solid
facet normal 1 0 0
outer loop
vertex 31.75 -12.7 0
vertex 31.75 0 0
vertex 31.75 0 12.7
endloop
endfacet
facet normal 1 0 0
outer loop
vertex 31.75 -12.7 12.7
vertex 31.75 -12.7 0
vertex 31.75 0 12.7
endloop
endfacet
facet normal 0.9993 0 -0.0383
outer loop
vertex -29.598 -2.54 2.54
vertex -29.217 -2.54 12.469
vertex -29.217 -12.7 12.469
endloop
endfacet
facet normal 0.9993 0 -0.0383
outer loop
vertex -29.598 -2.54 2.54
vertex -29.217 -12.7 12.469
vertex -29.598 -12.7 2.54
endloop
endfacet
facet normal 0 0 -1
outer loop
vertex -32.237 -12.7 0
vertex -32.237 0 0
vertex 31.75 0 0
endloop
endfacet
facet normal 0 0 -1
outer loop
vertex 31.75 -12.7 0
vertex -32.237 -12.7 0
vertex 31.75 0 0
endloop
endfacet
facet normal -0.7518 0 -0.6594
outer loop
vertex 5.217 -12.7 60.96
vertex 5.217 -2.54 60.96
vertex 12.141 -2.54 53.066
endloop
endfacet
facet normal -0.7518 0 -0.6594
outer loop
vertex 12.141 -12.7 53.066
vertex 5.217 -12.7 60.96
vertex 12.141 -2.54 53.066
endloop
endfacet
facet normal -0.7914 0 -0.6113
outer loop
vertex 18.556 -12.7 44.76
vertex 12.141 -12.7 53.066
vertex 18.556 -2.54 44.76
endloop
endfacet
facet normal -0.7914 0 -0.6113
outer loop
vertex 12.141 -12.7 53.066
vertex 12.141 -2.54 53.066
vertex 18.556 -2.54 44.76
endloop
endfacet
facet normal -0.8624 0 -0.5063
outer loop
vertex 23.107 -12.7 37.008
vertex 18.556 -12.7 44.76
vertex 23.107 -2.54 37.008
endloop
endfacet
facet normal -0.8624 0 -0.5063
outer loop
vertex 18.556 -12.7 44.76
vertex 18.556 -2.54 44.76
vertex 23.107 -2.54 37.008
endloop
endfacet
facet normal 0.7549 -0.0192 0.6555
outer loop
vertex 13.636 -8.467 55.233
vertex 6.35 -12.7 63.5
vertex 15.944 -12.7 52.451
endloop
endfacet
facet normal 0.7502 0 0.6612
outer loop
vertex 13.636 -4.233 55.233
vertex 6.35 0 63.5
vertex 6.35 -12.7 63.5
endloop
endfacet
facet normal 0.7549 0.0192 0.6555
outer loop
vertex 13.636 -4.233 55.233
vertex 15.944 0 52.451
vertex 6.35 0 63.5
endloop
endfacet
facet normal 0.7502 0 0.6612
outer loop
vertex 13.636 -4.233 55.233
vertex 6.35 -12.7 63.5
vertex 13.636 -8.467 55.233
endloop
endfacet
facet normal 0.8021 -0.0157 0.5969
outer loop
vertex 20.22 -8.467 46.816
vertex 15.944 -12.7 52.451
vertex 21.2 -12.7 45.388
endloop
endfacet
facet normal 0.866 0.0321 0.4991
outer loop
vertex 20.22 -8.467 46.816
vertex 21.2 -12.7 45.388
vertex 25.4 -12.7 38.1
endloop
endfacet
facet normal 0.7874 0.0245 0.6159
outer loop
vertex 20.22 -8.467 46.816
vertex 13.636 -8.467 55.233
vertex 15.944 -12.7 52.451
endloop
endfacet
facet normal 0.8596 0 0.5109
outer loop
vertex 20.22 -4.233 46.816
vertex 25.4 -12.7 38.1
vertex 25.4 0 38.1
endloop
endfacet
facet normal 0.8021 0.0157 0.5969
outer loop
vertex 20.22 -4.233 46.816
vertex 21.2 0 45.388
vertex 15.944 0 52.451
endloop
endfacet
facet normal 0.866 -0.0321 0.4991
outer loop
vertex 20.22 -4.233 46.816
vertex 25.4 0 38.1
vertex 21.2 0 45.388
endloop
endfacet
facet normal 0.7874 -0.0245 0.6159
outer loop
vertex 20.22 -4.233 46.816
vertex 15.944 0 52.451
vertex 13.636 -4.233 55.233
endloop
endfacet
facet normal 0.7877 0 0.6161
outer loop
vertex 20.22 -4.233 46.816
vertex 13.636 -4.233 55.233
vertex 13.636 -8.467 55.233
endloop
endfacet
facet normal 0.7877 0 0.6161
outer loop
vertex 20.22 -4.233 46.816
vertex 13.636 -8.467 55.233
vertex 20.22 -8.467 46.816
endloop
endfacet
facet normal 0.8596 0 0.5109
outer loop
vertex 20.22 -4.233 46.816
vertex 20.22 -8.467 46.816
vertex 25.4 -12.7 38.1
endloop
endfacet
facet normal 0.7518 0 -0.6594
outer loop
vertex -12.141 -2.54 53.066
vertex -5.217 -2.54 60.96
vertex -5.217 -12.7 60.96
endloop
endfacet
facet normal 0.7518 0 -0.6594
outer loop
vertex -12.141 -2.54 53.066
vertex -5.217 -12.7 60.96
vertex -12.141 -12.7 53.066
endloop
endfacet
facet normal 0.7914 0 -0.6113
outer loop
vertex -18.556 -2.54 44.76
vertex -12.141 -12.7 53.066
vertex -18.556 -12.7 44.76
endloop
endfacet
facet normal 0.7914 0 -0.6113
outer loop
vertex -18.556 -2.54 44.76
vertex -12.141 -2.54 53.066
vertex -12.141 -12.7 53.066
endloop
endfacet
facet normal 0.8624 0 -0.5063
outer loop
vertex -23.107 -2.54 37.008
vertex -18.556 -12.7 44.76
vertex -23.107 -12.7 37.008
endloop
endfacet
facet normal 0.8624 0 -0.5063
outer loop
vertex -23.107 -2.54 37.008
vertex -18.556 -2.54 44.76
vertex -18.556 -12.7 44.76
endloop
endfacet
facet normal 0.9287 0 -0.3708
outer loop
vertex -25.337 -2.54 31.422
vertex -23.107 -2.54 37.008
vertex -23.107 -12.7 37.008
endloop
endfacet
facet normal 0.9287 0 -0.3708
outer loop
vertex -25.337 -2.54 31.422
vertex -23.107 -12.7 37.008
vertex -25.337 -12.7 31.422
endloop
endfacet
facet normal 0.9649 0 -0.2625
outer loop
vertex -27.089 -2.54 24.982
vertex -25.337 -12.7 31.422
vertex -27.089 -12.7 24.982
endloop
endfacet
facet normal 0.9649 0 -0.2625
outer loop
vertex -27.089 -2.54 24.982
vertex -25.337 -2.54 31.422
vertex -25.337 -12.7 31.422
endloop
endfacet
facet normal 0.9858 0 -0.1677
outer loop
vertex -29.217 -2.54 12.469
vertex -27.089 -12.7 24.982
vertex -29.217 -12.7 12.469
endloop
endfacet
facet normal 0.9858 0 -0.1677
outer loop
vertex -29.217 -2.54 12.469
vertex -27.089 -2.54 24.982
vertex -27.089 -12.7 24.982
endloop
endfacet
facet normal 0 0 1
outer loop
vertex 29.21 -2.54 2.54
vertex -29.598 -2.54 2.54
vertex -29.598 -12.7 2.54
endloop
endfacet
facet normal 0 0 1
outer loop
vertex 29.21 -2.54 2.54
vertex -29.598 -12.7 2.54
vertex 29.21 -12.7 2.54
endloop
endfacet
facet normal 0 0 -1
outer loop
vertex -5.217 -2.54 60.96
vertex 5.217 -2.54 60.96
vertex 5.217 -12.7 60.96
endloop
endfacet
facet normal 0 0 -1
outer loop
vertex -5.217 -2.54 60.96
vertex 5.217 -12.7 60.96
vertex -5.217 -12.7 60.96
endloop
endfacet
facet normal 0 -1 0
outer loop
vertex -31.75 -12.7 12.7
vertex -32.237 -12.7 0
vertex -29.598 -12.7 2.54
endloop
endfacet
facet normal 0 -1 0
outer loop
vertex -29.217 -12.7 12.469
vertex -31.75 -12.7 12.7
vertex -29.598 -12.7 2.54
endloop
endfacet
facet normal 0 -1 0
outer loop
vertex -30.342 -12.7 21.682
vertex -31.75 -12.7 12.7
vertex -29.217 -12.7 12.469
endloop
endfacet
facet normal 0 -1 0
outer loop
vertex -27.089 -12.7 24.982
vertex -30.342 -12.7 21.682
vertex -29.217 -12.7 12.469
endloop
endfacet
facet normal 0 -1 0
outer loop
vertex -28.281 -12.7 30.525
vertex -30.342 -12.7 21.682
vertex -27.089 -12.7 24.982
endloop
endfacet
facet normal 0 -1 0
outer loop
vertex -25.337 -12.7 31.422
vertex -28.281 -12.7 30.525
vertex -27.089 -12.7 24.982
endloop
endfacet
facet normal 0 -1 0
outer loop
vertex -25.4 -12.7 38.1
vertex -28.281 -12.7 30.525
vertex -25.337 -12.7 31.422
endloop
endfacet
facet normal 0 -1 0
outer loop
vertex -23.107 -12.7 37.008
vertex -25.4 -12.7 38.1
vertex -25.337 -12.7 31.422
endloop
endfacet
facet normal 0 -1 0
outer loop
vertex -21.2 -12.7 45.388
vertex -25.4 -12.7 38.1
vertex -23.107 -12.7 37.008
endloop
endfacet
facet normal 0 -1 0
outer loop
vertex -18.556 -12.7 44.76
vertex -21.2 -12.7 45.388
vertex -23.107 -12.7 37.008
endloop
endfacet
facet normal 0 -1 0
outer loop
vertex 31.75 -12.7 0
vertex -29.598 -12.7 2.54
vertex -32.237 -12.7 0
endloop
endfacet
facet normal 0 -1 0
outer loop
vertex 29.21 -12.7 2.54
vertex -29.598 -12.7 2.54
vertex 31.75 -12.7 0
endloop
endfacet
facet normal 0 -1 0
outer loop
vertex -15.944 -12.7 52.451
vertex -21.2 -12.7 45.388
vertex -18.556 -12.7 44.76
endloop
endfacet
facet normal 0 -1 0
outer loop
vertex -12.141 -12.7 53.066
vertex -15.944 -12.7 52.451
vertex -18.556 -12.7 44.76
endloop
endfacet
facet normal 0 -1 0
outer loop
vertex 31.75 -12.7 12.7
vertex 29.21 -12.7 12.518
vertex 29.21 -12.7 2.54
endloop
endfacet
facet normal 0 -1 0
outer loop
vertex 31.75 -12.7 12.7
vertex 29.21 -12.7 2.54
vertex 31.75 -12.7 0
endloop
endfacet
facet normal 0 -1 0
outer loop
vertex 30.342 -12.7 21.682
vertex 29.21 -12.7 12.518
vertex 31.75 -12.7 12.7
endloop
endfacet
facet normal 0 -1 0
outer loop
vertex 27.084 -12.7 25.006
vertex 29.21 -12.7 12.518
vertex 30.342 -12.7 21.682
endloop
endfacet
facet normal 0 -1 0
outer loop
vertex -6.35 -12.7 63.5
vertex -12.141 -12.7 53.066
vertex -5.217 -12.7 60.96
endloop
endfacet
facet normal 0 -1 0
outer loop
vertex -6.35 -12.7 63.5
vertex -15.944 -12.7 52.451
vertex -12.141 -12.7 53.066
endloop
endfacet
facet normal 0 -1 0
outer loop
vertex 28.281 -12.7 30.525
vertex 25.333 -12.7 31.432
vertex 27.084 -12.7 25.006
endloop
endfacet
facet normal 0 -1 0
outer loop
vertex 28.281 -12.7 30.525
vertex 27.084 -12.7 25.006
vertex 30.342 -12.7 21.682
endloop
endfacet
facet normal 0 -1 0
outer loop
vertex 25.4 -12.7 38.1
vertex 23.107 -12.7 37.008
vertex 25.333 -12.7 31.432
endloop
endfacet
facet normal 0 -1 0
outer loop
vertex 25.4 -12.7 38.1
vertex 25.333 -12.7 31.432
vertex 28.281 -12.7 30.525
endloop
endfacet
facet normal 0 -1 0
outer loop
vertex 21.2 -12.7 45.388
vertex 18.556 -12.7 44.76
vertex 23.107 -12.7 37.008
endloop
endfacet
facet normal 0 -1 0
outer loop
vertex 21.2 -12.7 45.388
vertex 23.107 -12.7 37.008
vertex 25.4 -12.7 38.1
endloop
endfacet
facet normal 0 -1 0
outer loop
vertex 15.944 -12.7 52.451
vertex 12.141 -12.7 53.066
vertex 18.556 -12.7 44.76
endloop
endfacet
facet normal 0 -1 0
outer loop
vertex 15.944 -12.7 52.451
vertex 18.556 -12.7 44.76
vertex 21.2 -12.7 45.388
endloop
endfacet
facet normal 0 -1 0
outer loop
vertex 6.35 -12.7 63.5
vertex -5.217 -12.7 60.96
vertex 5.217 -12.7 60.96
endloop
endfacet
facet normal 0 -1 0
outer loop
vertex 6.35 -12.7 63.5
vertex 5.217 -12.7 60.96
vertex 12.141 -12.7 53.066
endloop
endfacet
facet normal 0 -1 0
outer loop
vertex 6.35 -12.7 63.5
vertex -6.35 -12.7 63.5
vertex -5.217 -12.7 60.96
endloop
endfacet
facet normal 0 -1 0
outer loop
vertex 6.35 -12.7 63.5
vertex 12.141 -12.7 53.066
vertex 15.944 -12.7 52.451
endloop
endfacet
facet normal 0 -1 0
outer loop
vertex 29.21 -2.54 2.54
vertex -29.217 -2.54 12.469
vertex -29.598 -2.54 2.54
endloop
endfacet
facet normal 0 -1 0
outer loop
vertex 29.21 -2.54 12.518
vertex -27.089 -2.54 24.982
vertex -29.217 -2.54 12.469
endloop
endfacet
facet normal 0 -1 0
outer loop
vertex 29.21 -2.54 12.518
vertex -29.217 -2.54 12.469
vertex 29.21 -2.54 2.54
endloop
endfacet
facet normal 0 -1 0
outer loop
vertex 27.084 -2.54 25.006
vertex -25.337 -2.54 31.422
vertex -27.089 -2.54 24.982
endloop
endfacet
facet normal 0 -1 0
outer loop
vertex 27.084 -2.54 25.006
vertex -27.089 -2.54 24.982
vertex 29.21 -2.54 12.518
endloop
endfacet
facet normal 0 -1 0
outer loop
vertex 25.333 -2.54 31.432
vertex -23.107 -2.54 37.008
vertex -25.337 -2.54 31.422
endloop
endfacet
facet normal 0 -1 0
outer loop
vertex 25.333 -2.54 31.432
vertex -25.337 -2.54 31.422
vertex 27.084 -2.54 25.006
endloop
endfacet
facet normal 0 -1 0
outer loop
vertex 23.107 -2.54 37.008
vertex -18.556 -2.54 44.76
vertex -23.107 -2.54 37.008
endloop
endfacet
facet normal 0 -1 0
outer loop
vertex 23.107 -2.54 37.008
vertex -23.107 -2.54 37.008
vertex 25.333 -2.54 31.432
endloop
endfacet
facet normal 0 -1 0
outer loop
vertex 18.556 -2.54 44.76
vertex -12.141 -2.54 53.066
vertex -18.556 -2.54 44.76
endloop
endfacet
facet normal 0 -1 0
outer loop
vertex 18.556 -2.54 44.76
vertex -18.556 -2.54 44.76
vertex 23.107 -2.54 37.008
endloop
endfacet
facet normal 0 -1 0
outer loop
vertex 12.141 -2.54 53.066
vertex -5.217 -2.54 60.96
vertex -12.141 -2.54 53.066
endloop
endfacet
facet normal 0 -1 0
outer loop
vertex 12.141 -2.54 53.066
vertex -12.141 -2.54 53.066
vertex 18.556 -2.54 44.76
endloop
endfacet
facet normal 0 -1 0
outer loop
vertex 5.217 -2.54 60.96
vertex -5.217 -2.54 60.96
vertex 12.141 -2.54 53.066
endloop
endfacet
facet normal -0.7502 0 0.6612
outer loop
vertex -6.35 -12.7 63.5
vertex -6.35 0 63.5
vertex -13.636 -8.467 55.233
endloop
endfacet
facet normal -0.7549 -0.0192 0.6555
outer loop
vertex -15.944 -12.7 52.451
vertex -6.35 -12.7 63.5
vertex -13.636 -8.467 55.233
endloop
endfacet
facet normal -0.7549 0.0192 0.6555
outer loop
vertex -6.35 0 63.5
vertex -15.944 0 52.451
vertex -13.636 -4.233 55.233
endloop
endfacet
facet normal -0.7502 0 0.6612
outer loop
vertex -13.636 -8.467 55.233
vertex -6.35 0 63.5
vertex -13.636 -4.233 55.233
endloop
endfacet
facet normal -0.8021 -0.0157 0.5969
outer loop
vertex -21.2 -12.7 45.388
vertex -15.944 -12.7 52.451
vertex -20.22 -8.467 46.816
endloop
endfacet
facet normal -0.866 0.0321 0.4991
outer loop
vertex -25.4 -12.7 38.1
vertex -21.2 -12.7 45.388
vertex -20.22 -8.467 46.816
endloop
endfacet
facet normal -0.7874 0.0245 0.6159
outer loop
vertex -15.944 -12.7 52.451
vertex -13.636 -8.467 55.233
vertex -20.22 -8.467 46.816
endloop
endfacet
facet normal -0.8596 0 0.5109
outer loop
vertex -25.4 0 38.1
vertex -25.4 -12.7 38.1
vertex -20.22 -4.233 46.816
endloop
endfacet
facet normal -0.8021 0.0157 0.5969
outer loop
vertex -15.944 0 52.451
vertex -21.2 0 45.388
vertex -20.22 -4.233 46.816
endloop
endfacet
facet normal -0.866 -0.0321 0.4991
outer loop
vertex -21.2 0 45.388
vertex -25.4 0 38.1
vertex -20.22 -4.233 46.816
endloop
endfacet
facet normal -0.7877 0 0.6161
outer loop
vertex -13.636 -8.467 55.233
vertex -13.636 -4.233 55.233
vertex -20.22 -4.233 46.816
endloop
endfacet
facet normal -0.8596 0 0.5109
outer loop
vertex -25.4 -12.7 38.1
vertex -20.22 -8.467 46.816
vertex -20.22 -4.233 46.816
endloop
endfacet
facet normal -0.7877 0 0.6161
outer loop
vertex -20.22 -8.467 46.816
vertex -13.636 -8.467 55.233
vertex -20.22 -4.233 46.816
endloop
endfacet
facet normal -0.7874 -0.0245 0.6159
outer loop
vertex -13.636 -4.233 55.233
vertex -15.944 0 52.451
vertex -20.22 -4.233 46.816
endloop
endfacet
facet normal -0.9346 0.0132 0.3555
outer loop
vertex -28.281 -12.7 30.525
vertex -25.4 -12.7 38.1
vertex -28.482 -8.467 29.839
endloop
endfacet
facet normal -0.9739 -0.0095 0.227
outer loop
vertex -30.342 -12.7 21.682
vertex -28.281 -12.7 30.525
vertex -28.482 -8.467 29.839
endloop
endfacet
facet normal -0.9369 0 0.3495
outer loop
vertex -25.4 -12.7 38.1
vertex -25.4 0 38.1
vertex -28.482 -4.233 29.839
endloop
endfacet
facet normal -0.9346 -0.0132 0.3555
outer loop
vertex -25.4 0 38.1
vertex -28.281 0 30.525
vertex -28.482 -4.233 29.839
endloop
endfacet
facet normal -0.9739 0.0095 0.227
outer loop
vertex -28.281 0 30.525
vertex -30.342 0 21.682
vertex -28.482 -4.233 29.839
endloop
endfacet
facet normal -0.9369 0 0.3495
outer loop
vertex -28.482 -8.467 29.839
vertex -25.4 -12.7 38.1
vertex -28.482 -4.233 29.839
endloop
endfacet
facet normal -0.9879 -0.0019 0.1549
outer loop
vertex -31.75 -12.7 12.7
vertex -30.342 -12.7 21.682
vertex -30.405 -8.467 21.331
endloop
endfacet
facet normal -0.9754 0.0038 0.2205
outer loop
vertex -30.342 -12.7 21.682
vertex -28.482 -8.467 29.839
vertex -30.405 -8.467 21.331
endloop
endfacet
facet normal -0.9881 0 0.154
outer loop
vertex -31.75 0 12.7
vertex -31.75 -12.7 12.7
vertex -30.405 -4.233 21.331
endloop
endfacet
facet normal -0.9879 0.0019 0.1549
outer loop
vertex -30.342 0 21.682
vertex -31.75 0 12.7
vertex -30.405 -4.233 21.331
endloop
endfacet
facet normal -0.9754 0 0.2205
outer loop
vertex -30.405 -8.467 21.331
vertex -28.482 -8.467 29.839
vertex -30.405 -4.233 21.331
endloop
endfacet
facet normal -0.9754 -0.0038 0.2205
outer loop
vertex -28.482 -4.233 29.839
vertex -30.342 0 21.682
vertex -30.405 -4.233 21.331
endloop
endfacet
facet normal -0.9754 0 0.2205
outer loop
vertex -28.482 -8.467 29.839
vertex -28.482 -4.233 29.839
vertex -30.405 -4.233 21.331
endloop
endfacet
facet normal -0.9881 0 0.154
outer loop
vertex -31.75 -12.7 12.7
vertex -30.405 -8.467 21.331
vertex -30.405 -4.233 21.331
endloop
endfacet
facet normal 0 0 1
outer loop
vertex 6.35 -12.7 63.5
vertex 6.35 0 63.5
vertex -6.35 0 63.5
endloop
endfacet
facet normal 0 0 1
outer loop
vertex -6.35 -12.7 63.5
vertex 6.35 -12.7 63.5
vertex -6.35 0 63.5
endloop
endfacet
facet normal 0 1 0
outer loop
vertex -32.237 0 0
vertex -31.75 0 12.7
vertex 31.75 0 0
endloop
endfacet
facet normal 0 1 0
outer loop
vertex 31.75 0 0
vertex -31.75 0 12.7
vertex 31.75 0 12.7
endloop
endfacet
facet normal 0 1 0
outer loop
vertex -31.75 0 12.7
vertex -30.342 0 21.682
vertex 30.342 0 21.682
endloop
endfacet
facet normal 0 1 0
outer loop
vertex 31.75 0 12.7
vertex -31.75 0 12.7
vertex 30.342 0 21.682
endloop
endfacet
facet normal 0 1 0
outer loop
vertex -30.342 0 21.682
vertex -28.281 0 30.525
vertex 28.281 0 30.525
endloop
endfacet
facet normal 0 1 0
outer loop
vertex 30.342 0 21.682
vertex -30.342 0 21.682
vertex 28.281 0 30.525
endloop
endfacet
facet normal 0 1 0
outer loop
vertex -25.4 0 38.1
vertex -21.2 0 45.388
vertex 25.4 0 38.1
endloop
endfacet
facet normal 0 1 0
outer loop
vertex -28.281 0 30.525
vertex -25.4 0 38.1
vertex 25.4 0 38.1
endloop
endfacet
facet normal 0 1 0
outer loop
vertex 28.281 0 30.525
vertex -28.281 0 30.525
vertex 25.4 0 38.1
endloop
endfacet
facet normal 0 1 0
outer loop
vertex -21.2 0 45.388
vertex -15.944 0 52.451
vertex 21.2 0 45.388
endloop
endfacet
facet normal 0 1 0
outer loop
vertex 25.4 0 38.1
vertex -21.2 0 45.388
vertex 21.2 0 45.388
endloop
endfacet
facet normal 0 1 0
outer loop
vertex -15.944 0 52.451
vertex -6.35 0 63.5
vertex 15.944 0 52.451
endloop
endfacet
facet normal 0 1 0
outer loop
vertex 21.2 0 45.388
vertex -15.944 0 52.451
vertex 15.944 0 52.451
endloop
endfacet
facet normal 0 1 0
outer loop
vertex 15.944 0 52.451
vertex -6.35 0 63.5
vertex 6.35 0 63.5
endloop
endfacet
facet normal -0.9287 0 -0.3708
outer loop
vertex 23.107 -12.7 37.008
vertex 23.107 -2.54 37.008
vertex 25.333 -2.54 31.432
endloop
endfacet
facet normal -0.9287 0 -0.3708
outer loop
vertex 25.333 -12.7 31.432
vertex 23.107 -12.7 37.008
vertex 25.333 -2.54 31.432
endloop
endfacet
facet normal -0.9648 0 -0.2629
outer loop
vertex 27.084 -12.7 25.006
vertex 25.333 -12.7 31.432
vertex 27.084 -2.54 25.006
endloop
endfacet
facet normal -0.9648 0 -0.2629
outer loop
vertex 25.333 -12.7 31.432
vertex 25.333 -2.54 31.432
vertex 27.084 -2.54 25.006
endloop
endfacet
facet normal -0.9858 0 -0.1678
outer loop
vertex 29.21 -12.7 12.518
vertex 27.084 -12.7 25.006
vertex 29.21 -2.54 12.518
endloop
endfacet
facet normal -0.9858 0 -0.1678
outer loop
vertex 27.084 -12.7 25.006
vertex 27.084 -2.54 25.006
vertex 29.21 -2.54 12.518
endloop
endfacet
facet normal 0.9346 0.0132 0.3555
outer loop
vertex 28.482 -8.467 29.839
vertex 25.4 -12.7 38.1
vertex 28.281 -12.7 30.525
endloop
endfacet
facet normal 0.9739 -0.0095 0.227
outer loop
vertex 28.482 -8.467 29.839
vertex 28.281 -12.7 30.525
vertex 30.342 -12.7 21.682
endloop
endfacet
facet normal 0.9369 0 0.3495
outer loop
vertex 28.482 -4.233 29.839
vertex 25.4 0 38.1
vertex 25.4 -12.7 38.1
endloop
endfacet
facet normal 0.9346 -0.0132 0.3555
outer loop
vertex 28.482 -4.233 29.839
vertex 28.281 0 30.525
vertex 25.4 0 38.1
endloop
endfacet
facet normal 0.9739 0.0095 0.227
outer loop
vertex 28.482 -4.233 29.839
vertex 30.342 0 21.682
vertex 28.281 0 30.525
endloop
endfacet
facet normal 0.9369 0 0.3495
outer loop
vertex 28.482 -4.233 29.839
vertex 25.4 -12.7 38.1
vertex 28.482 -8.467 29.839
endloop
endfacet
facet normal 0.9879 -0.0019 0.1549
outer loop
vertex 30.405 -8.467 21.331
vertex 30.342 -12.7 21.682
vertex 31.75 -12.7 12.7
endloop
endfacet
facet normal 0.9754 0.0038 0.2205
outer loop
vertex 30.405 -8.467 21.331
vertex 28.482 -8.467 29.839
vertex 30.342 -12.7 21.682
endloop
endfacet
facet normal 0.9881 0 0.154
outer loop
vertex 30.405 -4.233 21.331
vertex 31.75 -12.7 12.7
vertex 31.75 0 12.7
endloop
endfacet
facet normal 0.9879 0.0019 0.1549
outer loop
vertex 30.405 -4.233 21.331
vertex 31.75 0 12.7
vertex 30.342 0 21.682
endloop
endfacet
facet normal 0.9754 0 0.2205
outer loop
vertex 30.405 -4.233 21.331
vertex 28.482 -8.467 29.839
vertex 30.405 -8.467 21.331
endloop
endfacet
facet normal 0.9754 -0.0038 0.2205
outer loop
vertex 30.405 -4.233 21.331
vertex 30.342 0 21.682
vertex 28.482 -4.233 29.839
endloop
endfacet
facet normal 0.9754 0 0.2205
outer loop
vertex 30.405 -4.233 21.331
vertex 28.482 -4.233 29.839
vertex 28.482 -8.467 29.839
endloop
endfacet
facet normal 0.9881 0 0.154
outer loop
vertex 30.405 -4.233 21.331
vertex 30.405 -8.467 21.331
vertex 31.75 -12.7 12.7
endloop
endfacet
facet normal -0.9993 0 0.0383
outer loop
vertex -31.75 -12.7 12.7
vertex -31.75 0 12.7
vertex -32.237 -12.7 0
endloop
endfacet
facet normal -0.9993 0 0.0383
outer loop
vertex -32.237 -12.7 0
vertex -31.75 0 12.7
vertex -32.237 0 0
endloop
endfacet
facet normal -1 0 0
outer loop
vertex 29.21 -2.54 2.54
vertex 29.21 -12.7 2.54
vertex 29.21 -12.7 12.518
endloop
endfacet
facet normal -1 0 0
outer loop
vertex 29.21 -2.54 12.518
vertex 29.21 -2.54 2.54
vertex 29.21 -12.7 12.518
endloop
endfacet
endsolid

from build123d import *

# Parameters (mm, degrees)
F1_DEPTH = 12.7
F2_T     = -2.54


with BuildPart() as f1:
    # F0 (on Front) → F1 (new body)
    with BuildSketch(Plane.XZ):
        with BuildLine():
            Line((0, 0), (31.75, 0))
            Line((31.75, 0), (31.75, 12.7000007778))
            add(Edge.make_bspline(
                [(25.3999978304, 38.1000004709), (29.2536024334, 30.0036908619), (30.5018012167, 21.3518458199), (31.75, 12.7000007778)],
                knots=[0.5240852488, 0.5240852488, 0.5240852488, 0.5240852488, 1, 1, 1, 1], degree=3))
            Line((25.3999978304, 38.1000004709), (0, 38.1000004709))
            Line((0, 38.1000004709), (0, 0))
        make_face()
        with BuildLine():
            Line((-32.2369039059, 0), (0, 0))
            Line((0, 0), (0, 38.1000004709))
            Line((0, 38.1000004709), (-25.399999693, 38.1000004709))
            add(Edge.make_bspline(
                [(-25.399999693, 38.1000004709), (-29.2536043883, 30.0036909518), (-30.5018027008, 21.3518458648), (-31.7500010133, 12.7000007778)],
                knots=[0.5240852553, 0.5240852553, 0.5240852553, 0.5240852553, 1, 1, 1, 1], degree=3))
            Line((-31.7500010133, 12.7000007778), (-32.2369039059, 0))
        make_face()
        with BuildLine():
            Line((-25.399999693, 38.1000004709), (0, 38.1000004709))
            Line((0, 38.1000004709), (0, 63.5000020266))
            Line((0, 63.5000020266), (-6.3499994576, 63.5000020266))
            add(Edge.make_bspline(
                [(-6.3499994576, 63.5000020266), (-13.7531726904, 55.2578967946), (-21.1563459231, 47.0157915626), (-25.399999693, 38.1000004709)],
                knots=[0, 0, 0, 0, 0.5240852553, 0.5240852553, 0.5240852553, 0.5240852553], degree=3))
        make_face()
        with BuildLine():
            Line((0, 63.5000020266), (0, 38.1000004709))
            Line((0, 38.1000004709), (25.3999978304, 38.1000004709))
            add(Edge.make_bspline(
                [(6.3499999233, 63.5000020266), (13.7531720977, 55.2578967284), (21.1563442721, 47.0157914303), (25.3999978304, 38.1000004709)],
                knots=[0, 0, 0, 0, 0.5240852488, 0.5240852488, 0.5240852488, 0.5240852488], degree=3))
            Line((6.3499999233, 63.5000020266), (0, 63.5000020266))
        make_face()
    extrude(amount=F1_DEPTH)

    # F2
    f2_openings = [f1.faces().sort_by_distance(p)[0] for p in [
        (-0.031333, -12.7, 26.51292),
    ]]
    offset(amount=F2_T, openings=f2_openings, kind=Kind.INTERSECTION)


solid = f1.part
